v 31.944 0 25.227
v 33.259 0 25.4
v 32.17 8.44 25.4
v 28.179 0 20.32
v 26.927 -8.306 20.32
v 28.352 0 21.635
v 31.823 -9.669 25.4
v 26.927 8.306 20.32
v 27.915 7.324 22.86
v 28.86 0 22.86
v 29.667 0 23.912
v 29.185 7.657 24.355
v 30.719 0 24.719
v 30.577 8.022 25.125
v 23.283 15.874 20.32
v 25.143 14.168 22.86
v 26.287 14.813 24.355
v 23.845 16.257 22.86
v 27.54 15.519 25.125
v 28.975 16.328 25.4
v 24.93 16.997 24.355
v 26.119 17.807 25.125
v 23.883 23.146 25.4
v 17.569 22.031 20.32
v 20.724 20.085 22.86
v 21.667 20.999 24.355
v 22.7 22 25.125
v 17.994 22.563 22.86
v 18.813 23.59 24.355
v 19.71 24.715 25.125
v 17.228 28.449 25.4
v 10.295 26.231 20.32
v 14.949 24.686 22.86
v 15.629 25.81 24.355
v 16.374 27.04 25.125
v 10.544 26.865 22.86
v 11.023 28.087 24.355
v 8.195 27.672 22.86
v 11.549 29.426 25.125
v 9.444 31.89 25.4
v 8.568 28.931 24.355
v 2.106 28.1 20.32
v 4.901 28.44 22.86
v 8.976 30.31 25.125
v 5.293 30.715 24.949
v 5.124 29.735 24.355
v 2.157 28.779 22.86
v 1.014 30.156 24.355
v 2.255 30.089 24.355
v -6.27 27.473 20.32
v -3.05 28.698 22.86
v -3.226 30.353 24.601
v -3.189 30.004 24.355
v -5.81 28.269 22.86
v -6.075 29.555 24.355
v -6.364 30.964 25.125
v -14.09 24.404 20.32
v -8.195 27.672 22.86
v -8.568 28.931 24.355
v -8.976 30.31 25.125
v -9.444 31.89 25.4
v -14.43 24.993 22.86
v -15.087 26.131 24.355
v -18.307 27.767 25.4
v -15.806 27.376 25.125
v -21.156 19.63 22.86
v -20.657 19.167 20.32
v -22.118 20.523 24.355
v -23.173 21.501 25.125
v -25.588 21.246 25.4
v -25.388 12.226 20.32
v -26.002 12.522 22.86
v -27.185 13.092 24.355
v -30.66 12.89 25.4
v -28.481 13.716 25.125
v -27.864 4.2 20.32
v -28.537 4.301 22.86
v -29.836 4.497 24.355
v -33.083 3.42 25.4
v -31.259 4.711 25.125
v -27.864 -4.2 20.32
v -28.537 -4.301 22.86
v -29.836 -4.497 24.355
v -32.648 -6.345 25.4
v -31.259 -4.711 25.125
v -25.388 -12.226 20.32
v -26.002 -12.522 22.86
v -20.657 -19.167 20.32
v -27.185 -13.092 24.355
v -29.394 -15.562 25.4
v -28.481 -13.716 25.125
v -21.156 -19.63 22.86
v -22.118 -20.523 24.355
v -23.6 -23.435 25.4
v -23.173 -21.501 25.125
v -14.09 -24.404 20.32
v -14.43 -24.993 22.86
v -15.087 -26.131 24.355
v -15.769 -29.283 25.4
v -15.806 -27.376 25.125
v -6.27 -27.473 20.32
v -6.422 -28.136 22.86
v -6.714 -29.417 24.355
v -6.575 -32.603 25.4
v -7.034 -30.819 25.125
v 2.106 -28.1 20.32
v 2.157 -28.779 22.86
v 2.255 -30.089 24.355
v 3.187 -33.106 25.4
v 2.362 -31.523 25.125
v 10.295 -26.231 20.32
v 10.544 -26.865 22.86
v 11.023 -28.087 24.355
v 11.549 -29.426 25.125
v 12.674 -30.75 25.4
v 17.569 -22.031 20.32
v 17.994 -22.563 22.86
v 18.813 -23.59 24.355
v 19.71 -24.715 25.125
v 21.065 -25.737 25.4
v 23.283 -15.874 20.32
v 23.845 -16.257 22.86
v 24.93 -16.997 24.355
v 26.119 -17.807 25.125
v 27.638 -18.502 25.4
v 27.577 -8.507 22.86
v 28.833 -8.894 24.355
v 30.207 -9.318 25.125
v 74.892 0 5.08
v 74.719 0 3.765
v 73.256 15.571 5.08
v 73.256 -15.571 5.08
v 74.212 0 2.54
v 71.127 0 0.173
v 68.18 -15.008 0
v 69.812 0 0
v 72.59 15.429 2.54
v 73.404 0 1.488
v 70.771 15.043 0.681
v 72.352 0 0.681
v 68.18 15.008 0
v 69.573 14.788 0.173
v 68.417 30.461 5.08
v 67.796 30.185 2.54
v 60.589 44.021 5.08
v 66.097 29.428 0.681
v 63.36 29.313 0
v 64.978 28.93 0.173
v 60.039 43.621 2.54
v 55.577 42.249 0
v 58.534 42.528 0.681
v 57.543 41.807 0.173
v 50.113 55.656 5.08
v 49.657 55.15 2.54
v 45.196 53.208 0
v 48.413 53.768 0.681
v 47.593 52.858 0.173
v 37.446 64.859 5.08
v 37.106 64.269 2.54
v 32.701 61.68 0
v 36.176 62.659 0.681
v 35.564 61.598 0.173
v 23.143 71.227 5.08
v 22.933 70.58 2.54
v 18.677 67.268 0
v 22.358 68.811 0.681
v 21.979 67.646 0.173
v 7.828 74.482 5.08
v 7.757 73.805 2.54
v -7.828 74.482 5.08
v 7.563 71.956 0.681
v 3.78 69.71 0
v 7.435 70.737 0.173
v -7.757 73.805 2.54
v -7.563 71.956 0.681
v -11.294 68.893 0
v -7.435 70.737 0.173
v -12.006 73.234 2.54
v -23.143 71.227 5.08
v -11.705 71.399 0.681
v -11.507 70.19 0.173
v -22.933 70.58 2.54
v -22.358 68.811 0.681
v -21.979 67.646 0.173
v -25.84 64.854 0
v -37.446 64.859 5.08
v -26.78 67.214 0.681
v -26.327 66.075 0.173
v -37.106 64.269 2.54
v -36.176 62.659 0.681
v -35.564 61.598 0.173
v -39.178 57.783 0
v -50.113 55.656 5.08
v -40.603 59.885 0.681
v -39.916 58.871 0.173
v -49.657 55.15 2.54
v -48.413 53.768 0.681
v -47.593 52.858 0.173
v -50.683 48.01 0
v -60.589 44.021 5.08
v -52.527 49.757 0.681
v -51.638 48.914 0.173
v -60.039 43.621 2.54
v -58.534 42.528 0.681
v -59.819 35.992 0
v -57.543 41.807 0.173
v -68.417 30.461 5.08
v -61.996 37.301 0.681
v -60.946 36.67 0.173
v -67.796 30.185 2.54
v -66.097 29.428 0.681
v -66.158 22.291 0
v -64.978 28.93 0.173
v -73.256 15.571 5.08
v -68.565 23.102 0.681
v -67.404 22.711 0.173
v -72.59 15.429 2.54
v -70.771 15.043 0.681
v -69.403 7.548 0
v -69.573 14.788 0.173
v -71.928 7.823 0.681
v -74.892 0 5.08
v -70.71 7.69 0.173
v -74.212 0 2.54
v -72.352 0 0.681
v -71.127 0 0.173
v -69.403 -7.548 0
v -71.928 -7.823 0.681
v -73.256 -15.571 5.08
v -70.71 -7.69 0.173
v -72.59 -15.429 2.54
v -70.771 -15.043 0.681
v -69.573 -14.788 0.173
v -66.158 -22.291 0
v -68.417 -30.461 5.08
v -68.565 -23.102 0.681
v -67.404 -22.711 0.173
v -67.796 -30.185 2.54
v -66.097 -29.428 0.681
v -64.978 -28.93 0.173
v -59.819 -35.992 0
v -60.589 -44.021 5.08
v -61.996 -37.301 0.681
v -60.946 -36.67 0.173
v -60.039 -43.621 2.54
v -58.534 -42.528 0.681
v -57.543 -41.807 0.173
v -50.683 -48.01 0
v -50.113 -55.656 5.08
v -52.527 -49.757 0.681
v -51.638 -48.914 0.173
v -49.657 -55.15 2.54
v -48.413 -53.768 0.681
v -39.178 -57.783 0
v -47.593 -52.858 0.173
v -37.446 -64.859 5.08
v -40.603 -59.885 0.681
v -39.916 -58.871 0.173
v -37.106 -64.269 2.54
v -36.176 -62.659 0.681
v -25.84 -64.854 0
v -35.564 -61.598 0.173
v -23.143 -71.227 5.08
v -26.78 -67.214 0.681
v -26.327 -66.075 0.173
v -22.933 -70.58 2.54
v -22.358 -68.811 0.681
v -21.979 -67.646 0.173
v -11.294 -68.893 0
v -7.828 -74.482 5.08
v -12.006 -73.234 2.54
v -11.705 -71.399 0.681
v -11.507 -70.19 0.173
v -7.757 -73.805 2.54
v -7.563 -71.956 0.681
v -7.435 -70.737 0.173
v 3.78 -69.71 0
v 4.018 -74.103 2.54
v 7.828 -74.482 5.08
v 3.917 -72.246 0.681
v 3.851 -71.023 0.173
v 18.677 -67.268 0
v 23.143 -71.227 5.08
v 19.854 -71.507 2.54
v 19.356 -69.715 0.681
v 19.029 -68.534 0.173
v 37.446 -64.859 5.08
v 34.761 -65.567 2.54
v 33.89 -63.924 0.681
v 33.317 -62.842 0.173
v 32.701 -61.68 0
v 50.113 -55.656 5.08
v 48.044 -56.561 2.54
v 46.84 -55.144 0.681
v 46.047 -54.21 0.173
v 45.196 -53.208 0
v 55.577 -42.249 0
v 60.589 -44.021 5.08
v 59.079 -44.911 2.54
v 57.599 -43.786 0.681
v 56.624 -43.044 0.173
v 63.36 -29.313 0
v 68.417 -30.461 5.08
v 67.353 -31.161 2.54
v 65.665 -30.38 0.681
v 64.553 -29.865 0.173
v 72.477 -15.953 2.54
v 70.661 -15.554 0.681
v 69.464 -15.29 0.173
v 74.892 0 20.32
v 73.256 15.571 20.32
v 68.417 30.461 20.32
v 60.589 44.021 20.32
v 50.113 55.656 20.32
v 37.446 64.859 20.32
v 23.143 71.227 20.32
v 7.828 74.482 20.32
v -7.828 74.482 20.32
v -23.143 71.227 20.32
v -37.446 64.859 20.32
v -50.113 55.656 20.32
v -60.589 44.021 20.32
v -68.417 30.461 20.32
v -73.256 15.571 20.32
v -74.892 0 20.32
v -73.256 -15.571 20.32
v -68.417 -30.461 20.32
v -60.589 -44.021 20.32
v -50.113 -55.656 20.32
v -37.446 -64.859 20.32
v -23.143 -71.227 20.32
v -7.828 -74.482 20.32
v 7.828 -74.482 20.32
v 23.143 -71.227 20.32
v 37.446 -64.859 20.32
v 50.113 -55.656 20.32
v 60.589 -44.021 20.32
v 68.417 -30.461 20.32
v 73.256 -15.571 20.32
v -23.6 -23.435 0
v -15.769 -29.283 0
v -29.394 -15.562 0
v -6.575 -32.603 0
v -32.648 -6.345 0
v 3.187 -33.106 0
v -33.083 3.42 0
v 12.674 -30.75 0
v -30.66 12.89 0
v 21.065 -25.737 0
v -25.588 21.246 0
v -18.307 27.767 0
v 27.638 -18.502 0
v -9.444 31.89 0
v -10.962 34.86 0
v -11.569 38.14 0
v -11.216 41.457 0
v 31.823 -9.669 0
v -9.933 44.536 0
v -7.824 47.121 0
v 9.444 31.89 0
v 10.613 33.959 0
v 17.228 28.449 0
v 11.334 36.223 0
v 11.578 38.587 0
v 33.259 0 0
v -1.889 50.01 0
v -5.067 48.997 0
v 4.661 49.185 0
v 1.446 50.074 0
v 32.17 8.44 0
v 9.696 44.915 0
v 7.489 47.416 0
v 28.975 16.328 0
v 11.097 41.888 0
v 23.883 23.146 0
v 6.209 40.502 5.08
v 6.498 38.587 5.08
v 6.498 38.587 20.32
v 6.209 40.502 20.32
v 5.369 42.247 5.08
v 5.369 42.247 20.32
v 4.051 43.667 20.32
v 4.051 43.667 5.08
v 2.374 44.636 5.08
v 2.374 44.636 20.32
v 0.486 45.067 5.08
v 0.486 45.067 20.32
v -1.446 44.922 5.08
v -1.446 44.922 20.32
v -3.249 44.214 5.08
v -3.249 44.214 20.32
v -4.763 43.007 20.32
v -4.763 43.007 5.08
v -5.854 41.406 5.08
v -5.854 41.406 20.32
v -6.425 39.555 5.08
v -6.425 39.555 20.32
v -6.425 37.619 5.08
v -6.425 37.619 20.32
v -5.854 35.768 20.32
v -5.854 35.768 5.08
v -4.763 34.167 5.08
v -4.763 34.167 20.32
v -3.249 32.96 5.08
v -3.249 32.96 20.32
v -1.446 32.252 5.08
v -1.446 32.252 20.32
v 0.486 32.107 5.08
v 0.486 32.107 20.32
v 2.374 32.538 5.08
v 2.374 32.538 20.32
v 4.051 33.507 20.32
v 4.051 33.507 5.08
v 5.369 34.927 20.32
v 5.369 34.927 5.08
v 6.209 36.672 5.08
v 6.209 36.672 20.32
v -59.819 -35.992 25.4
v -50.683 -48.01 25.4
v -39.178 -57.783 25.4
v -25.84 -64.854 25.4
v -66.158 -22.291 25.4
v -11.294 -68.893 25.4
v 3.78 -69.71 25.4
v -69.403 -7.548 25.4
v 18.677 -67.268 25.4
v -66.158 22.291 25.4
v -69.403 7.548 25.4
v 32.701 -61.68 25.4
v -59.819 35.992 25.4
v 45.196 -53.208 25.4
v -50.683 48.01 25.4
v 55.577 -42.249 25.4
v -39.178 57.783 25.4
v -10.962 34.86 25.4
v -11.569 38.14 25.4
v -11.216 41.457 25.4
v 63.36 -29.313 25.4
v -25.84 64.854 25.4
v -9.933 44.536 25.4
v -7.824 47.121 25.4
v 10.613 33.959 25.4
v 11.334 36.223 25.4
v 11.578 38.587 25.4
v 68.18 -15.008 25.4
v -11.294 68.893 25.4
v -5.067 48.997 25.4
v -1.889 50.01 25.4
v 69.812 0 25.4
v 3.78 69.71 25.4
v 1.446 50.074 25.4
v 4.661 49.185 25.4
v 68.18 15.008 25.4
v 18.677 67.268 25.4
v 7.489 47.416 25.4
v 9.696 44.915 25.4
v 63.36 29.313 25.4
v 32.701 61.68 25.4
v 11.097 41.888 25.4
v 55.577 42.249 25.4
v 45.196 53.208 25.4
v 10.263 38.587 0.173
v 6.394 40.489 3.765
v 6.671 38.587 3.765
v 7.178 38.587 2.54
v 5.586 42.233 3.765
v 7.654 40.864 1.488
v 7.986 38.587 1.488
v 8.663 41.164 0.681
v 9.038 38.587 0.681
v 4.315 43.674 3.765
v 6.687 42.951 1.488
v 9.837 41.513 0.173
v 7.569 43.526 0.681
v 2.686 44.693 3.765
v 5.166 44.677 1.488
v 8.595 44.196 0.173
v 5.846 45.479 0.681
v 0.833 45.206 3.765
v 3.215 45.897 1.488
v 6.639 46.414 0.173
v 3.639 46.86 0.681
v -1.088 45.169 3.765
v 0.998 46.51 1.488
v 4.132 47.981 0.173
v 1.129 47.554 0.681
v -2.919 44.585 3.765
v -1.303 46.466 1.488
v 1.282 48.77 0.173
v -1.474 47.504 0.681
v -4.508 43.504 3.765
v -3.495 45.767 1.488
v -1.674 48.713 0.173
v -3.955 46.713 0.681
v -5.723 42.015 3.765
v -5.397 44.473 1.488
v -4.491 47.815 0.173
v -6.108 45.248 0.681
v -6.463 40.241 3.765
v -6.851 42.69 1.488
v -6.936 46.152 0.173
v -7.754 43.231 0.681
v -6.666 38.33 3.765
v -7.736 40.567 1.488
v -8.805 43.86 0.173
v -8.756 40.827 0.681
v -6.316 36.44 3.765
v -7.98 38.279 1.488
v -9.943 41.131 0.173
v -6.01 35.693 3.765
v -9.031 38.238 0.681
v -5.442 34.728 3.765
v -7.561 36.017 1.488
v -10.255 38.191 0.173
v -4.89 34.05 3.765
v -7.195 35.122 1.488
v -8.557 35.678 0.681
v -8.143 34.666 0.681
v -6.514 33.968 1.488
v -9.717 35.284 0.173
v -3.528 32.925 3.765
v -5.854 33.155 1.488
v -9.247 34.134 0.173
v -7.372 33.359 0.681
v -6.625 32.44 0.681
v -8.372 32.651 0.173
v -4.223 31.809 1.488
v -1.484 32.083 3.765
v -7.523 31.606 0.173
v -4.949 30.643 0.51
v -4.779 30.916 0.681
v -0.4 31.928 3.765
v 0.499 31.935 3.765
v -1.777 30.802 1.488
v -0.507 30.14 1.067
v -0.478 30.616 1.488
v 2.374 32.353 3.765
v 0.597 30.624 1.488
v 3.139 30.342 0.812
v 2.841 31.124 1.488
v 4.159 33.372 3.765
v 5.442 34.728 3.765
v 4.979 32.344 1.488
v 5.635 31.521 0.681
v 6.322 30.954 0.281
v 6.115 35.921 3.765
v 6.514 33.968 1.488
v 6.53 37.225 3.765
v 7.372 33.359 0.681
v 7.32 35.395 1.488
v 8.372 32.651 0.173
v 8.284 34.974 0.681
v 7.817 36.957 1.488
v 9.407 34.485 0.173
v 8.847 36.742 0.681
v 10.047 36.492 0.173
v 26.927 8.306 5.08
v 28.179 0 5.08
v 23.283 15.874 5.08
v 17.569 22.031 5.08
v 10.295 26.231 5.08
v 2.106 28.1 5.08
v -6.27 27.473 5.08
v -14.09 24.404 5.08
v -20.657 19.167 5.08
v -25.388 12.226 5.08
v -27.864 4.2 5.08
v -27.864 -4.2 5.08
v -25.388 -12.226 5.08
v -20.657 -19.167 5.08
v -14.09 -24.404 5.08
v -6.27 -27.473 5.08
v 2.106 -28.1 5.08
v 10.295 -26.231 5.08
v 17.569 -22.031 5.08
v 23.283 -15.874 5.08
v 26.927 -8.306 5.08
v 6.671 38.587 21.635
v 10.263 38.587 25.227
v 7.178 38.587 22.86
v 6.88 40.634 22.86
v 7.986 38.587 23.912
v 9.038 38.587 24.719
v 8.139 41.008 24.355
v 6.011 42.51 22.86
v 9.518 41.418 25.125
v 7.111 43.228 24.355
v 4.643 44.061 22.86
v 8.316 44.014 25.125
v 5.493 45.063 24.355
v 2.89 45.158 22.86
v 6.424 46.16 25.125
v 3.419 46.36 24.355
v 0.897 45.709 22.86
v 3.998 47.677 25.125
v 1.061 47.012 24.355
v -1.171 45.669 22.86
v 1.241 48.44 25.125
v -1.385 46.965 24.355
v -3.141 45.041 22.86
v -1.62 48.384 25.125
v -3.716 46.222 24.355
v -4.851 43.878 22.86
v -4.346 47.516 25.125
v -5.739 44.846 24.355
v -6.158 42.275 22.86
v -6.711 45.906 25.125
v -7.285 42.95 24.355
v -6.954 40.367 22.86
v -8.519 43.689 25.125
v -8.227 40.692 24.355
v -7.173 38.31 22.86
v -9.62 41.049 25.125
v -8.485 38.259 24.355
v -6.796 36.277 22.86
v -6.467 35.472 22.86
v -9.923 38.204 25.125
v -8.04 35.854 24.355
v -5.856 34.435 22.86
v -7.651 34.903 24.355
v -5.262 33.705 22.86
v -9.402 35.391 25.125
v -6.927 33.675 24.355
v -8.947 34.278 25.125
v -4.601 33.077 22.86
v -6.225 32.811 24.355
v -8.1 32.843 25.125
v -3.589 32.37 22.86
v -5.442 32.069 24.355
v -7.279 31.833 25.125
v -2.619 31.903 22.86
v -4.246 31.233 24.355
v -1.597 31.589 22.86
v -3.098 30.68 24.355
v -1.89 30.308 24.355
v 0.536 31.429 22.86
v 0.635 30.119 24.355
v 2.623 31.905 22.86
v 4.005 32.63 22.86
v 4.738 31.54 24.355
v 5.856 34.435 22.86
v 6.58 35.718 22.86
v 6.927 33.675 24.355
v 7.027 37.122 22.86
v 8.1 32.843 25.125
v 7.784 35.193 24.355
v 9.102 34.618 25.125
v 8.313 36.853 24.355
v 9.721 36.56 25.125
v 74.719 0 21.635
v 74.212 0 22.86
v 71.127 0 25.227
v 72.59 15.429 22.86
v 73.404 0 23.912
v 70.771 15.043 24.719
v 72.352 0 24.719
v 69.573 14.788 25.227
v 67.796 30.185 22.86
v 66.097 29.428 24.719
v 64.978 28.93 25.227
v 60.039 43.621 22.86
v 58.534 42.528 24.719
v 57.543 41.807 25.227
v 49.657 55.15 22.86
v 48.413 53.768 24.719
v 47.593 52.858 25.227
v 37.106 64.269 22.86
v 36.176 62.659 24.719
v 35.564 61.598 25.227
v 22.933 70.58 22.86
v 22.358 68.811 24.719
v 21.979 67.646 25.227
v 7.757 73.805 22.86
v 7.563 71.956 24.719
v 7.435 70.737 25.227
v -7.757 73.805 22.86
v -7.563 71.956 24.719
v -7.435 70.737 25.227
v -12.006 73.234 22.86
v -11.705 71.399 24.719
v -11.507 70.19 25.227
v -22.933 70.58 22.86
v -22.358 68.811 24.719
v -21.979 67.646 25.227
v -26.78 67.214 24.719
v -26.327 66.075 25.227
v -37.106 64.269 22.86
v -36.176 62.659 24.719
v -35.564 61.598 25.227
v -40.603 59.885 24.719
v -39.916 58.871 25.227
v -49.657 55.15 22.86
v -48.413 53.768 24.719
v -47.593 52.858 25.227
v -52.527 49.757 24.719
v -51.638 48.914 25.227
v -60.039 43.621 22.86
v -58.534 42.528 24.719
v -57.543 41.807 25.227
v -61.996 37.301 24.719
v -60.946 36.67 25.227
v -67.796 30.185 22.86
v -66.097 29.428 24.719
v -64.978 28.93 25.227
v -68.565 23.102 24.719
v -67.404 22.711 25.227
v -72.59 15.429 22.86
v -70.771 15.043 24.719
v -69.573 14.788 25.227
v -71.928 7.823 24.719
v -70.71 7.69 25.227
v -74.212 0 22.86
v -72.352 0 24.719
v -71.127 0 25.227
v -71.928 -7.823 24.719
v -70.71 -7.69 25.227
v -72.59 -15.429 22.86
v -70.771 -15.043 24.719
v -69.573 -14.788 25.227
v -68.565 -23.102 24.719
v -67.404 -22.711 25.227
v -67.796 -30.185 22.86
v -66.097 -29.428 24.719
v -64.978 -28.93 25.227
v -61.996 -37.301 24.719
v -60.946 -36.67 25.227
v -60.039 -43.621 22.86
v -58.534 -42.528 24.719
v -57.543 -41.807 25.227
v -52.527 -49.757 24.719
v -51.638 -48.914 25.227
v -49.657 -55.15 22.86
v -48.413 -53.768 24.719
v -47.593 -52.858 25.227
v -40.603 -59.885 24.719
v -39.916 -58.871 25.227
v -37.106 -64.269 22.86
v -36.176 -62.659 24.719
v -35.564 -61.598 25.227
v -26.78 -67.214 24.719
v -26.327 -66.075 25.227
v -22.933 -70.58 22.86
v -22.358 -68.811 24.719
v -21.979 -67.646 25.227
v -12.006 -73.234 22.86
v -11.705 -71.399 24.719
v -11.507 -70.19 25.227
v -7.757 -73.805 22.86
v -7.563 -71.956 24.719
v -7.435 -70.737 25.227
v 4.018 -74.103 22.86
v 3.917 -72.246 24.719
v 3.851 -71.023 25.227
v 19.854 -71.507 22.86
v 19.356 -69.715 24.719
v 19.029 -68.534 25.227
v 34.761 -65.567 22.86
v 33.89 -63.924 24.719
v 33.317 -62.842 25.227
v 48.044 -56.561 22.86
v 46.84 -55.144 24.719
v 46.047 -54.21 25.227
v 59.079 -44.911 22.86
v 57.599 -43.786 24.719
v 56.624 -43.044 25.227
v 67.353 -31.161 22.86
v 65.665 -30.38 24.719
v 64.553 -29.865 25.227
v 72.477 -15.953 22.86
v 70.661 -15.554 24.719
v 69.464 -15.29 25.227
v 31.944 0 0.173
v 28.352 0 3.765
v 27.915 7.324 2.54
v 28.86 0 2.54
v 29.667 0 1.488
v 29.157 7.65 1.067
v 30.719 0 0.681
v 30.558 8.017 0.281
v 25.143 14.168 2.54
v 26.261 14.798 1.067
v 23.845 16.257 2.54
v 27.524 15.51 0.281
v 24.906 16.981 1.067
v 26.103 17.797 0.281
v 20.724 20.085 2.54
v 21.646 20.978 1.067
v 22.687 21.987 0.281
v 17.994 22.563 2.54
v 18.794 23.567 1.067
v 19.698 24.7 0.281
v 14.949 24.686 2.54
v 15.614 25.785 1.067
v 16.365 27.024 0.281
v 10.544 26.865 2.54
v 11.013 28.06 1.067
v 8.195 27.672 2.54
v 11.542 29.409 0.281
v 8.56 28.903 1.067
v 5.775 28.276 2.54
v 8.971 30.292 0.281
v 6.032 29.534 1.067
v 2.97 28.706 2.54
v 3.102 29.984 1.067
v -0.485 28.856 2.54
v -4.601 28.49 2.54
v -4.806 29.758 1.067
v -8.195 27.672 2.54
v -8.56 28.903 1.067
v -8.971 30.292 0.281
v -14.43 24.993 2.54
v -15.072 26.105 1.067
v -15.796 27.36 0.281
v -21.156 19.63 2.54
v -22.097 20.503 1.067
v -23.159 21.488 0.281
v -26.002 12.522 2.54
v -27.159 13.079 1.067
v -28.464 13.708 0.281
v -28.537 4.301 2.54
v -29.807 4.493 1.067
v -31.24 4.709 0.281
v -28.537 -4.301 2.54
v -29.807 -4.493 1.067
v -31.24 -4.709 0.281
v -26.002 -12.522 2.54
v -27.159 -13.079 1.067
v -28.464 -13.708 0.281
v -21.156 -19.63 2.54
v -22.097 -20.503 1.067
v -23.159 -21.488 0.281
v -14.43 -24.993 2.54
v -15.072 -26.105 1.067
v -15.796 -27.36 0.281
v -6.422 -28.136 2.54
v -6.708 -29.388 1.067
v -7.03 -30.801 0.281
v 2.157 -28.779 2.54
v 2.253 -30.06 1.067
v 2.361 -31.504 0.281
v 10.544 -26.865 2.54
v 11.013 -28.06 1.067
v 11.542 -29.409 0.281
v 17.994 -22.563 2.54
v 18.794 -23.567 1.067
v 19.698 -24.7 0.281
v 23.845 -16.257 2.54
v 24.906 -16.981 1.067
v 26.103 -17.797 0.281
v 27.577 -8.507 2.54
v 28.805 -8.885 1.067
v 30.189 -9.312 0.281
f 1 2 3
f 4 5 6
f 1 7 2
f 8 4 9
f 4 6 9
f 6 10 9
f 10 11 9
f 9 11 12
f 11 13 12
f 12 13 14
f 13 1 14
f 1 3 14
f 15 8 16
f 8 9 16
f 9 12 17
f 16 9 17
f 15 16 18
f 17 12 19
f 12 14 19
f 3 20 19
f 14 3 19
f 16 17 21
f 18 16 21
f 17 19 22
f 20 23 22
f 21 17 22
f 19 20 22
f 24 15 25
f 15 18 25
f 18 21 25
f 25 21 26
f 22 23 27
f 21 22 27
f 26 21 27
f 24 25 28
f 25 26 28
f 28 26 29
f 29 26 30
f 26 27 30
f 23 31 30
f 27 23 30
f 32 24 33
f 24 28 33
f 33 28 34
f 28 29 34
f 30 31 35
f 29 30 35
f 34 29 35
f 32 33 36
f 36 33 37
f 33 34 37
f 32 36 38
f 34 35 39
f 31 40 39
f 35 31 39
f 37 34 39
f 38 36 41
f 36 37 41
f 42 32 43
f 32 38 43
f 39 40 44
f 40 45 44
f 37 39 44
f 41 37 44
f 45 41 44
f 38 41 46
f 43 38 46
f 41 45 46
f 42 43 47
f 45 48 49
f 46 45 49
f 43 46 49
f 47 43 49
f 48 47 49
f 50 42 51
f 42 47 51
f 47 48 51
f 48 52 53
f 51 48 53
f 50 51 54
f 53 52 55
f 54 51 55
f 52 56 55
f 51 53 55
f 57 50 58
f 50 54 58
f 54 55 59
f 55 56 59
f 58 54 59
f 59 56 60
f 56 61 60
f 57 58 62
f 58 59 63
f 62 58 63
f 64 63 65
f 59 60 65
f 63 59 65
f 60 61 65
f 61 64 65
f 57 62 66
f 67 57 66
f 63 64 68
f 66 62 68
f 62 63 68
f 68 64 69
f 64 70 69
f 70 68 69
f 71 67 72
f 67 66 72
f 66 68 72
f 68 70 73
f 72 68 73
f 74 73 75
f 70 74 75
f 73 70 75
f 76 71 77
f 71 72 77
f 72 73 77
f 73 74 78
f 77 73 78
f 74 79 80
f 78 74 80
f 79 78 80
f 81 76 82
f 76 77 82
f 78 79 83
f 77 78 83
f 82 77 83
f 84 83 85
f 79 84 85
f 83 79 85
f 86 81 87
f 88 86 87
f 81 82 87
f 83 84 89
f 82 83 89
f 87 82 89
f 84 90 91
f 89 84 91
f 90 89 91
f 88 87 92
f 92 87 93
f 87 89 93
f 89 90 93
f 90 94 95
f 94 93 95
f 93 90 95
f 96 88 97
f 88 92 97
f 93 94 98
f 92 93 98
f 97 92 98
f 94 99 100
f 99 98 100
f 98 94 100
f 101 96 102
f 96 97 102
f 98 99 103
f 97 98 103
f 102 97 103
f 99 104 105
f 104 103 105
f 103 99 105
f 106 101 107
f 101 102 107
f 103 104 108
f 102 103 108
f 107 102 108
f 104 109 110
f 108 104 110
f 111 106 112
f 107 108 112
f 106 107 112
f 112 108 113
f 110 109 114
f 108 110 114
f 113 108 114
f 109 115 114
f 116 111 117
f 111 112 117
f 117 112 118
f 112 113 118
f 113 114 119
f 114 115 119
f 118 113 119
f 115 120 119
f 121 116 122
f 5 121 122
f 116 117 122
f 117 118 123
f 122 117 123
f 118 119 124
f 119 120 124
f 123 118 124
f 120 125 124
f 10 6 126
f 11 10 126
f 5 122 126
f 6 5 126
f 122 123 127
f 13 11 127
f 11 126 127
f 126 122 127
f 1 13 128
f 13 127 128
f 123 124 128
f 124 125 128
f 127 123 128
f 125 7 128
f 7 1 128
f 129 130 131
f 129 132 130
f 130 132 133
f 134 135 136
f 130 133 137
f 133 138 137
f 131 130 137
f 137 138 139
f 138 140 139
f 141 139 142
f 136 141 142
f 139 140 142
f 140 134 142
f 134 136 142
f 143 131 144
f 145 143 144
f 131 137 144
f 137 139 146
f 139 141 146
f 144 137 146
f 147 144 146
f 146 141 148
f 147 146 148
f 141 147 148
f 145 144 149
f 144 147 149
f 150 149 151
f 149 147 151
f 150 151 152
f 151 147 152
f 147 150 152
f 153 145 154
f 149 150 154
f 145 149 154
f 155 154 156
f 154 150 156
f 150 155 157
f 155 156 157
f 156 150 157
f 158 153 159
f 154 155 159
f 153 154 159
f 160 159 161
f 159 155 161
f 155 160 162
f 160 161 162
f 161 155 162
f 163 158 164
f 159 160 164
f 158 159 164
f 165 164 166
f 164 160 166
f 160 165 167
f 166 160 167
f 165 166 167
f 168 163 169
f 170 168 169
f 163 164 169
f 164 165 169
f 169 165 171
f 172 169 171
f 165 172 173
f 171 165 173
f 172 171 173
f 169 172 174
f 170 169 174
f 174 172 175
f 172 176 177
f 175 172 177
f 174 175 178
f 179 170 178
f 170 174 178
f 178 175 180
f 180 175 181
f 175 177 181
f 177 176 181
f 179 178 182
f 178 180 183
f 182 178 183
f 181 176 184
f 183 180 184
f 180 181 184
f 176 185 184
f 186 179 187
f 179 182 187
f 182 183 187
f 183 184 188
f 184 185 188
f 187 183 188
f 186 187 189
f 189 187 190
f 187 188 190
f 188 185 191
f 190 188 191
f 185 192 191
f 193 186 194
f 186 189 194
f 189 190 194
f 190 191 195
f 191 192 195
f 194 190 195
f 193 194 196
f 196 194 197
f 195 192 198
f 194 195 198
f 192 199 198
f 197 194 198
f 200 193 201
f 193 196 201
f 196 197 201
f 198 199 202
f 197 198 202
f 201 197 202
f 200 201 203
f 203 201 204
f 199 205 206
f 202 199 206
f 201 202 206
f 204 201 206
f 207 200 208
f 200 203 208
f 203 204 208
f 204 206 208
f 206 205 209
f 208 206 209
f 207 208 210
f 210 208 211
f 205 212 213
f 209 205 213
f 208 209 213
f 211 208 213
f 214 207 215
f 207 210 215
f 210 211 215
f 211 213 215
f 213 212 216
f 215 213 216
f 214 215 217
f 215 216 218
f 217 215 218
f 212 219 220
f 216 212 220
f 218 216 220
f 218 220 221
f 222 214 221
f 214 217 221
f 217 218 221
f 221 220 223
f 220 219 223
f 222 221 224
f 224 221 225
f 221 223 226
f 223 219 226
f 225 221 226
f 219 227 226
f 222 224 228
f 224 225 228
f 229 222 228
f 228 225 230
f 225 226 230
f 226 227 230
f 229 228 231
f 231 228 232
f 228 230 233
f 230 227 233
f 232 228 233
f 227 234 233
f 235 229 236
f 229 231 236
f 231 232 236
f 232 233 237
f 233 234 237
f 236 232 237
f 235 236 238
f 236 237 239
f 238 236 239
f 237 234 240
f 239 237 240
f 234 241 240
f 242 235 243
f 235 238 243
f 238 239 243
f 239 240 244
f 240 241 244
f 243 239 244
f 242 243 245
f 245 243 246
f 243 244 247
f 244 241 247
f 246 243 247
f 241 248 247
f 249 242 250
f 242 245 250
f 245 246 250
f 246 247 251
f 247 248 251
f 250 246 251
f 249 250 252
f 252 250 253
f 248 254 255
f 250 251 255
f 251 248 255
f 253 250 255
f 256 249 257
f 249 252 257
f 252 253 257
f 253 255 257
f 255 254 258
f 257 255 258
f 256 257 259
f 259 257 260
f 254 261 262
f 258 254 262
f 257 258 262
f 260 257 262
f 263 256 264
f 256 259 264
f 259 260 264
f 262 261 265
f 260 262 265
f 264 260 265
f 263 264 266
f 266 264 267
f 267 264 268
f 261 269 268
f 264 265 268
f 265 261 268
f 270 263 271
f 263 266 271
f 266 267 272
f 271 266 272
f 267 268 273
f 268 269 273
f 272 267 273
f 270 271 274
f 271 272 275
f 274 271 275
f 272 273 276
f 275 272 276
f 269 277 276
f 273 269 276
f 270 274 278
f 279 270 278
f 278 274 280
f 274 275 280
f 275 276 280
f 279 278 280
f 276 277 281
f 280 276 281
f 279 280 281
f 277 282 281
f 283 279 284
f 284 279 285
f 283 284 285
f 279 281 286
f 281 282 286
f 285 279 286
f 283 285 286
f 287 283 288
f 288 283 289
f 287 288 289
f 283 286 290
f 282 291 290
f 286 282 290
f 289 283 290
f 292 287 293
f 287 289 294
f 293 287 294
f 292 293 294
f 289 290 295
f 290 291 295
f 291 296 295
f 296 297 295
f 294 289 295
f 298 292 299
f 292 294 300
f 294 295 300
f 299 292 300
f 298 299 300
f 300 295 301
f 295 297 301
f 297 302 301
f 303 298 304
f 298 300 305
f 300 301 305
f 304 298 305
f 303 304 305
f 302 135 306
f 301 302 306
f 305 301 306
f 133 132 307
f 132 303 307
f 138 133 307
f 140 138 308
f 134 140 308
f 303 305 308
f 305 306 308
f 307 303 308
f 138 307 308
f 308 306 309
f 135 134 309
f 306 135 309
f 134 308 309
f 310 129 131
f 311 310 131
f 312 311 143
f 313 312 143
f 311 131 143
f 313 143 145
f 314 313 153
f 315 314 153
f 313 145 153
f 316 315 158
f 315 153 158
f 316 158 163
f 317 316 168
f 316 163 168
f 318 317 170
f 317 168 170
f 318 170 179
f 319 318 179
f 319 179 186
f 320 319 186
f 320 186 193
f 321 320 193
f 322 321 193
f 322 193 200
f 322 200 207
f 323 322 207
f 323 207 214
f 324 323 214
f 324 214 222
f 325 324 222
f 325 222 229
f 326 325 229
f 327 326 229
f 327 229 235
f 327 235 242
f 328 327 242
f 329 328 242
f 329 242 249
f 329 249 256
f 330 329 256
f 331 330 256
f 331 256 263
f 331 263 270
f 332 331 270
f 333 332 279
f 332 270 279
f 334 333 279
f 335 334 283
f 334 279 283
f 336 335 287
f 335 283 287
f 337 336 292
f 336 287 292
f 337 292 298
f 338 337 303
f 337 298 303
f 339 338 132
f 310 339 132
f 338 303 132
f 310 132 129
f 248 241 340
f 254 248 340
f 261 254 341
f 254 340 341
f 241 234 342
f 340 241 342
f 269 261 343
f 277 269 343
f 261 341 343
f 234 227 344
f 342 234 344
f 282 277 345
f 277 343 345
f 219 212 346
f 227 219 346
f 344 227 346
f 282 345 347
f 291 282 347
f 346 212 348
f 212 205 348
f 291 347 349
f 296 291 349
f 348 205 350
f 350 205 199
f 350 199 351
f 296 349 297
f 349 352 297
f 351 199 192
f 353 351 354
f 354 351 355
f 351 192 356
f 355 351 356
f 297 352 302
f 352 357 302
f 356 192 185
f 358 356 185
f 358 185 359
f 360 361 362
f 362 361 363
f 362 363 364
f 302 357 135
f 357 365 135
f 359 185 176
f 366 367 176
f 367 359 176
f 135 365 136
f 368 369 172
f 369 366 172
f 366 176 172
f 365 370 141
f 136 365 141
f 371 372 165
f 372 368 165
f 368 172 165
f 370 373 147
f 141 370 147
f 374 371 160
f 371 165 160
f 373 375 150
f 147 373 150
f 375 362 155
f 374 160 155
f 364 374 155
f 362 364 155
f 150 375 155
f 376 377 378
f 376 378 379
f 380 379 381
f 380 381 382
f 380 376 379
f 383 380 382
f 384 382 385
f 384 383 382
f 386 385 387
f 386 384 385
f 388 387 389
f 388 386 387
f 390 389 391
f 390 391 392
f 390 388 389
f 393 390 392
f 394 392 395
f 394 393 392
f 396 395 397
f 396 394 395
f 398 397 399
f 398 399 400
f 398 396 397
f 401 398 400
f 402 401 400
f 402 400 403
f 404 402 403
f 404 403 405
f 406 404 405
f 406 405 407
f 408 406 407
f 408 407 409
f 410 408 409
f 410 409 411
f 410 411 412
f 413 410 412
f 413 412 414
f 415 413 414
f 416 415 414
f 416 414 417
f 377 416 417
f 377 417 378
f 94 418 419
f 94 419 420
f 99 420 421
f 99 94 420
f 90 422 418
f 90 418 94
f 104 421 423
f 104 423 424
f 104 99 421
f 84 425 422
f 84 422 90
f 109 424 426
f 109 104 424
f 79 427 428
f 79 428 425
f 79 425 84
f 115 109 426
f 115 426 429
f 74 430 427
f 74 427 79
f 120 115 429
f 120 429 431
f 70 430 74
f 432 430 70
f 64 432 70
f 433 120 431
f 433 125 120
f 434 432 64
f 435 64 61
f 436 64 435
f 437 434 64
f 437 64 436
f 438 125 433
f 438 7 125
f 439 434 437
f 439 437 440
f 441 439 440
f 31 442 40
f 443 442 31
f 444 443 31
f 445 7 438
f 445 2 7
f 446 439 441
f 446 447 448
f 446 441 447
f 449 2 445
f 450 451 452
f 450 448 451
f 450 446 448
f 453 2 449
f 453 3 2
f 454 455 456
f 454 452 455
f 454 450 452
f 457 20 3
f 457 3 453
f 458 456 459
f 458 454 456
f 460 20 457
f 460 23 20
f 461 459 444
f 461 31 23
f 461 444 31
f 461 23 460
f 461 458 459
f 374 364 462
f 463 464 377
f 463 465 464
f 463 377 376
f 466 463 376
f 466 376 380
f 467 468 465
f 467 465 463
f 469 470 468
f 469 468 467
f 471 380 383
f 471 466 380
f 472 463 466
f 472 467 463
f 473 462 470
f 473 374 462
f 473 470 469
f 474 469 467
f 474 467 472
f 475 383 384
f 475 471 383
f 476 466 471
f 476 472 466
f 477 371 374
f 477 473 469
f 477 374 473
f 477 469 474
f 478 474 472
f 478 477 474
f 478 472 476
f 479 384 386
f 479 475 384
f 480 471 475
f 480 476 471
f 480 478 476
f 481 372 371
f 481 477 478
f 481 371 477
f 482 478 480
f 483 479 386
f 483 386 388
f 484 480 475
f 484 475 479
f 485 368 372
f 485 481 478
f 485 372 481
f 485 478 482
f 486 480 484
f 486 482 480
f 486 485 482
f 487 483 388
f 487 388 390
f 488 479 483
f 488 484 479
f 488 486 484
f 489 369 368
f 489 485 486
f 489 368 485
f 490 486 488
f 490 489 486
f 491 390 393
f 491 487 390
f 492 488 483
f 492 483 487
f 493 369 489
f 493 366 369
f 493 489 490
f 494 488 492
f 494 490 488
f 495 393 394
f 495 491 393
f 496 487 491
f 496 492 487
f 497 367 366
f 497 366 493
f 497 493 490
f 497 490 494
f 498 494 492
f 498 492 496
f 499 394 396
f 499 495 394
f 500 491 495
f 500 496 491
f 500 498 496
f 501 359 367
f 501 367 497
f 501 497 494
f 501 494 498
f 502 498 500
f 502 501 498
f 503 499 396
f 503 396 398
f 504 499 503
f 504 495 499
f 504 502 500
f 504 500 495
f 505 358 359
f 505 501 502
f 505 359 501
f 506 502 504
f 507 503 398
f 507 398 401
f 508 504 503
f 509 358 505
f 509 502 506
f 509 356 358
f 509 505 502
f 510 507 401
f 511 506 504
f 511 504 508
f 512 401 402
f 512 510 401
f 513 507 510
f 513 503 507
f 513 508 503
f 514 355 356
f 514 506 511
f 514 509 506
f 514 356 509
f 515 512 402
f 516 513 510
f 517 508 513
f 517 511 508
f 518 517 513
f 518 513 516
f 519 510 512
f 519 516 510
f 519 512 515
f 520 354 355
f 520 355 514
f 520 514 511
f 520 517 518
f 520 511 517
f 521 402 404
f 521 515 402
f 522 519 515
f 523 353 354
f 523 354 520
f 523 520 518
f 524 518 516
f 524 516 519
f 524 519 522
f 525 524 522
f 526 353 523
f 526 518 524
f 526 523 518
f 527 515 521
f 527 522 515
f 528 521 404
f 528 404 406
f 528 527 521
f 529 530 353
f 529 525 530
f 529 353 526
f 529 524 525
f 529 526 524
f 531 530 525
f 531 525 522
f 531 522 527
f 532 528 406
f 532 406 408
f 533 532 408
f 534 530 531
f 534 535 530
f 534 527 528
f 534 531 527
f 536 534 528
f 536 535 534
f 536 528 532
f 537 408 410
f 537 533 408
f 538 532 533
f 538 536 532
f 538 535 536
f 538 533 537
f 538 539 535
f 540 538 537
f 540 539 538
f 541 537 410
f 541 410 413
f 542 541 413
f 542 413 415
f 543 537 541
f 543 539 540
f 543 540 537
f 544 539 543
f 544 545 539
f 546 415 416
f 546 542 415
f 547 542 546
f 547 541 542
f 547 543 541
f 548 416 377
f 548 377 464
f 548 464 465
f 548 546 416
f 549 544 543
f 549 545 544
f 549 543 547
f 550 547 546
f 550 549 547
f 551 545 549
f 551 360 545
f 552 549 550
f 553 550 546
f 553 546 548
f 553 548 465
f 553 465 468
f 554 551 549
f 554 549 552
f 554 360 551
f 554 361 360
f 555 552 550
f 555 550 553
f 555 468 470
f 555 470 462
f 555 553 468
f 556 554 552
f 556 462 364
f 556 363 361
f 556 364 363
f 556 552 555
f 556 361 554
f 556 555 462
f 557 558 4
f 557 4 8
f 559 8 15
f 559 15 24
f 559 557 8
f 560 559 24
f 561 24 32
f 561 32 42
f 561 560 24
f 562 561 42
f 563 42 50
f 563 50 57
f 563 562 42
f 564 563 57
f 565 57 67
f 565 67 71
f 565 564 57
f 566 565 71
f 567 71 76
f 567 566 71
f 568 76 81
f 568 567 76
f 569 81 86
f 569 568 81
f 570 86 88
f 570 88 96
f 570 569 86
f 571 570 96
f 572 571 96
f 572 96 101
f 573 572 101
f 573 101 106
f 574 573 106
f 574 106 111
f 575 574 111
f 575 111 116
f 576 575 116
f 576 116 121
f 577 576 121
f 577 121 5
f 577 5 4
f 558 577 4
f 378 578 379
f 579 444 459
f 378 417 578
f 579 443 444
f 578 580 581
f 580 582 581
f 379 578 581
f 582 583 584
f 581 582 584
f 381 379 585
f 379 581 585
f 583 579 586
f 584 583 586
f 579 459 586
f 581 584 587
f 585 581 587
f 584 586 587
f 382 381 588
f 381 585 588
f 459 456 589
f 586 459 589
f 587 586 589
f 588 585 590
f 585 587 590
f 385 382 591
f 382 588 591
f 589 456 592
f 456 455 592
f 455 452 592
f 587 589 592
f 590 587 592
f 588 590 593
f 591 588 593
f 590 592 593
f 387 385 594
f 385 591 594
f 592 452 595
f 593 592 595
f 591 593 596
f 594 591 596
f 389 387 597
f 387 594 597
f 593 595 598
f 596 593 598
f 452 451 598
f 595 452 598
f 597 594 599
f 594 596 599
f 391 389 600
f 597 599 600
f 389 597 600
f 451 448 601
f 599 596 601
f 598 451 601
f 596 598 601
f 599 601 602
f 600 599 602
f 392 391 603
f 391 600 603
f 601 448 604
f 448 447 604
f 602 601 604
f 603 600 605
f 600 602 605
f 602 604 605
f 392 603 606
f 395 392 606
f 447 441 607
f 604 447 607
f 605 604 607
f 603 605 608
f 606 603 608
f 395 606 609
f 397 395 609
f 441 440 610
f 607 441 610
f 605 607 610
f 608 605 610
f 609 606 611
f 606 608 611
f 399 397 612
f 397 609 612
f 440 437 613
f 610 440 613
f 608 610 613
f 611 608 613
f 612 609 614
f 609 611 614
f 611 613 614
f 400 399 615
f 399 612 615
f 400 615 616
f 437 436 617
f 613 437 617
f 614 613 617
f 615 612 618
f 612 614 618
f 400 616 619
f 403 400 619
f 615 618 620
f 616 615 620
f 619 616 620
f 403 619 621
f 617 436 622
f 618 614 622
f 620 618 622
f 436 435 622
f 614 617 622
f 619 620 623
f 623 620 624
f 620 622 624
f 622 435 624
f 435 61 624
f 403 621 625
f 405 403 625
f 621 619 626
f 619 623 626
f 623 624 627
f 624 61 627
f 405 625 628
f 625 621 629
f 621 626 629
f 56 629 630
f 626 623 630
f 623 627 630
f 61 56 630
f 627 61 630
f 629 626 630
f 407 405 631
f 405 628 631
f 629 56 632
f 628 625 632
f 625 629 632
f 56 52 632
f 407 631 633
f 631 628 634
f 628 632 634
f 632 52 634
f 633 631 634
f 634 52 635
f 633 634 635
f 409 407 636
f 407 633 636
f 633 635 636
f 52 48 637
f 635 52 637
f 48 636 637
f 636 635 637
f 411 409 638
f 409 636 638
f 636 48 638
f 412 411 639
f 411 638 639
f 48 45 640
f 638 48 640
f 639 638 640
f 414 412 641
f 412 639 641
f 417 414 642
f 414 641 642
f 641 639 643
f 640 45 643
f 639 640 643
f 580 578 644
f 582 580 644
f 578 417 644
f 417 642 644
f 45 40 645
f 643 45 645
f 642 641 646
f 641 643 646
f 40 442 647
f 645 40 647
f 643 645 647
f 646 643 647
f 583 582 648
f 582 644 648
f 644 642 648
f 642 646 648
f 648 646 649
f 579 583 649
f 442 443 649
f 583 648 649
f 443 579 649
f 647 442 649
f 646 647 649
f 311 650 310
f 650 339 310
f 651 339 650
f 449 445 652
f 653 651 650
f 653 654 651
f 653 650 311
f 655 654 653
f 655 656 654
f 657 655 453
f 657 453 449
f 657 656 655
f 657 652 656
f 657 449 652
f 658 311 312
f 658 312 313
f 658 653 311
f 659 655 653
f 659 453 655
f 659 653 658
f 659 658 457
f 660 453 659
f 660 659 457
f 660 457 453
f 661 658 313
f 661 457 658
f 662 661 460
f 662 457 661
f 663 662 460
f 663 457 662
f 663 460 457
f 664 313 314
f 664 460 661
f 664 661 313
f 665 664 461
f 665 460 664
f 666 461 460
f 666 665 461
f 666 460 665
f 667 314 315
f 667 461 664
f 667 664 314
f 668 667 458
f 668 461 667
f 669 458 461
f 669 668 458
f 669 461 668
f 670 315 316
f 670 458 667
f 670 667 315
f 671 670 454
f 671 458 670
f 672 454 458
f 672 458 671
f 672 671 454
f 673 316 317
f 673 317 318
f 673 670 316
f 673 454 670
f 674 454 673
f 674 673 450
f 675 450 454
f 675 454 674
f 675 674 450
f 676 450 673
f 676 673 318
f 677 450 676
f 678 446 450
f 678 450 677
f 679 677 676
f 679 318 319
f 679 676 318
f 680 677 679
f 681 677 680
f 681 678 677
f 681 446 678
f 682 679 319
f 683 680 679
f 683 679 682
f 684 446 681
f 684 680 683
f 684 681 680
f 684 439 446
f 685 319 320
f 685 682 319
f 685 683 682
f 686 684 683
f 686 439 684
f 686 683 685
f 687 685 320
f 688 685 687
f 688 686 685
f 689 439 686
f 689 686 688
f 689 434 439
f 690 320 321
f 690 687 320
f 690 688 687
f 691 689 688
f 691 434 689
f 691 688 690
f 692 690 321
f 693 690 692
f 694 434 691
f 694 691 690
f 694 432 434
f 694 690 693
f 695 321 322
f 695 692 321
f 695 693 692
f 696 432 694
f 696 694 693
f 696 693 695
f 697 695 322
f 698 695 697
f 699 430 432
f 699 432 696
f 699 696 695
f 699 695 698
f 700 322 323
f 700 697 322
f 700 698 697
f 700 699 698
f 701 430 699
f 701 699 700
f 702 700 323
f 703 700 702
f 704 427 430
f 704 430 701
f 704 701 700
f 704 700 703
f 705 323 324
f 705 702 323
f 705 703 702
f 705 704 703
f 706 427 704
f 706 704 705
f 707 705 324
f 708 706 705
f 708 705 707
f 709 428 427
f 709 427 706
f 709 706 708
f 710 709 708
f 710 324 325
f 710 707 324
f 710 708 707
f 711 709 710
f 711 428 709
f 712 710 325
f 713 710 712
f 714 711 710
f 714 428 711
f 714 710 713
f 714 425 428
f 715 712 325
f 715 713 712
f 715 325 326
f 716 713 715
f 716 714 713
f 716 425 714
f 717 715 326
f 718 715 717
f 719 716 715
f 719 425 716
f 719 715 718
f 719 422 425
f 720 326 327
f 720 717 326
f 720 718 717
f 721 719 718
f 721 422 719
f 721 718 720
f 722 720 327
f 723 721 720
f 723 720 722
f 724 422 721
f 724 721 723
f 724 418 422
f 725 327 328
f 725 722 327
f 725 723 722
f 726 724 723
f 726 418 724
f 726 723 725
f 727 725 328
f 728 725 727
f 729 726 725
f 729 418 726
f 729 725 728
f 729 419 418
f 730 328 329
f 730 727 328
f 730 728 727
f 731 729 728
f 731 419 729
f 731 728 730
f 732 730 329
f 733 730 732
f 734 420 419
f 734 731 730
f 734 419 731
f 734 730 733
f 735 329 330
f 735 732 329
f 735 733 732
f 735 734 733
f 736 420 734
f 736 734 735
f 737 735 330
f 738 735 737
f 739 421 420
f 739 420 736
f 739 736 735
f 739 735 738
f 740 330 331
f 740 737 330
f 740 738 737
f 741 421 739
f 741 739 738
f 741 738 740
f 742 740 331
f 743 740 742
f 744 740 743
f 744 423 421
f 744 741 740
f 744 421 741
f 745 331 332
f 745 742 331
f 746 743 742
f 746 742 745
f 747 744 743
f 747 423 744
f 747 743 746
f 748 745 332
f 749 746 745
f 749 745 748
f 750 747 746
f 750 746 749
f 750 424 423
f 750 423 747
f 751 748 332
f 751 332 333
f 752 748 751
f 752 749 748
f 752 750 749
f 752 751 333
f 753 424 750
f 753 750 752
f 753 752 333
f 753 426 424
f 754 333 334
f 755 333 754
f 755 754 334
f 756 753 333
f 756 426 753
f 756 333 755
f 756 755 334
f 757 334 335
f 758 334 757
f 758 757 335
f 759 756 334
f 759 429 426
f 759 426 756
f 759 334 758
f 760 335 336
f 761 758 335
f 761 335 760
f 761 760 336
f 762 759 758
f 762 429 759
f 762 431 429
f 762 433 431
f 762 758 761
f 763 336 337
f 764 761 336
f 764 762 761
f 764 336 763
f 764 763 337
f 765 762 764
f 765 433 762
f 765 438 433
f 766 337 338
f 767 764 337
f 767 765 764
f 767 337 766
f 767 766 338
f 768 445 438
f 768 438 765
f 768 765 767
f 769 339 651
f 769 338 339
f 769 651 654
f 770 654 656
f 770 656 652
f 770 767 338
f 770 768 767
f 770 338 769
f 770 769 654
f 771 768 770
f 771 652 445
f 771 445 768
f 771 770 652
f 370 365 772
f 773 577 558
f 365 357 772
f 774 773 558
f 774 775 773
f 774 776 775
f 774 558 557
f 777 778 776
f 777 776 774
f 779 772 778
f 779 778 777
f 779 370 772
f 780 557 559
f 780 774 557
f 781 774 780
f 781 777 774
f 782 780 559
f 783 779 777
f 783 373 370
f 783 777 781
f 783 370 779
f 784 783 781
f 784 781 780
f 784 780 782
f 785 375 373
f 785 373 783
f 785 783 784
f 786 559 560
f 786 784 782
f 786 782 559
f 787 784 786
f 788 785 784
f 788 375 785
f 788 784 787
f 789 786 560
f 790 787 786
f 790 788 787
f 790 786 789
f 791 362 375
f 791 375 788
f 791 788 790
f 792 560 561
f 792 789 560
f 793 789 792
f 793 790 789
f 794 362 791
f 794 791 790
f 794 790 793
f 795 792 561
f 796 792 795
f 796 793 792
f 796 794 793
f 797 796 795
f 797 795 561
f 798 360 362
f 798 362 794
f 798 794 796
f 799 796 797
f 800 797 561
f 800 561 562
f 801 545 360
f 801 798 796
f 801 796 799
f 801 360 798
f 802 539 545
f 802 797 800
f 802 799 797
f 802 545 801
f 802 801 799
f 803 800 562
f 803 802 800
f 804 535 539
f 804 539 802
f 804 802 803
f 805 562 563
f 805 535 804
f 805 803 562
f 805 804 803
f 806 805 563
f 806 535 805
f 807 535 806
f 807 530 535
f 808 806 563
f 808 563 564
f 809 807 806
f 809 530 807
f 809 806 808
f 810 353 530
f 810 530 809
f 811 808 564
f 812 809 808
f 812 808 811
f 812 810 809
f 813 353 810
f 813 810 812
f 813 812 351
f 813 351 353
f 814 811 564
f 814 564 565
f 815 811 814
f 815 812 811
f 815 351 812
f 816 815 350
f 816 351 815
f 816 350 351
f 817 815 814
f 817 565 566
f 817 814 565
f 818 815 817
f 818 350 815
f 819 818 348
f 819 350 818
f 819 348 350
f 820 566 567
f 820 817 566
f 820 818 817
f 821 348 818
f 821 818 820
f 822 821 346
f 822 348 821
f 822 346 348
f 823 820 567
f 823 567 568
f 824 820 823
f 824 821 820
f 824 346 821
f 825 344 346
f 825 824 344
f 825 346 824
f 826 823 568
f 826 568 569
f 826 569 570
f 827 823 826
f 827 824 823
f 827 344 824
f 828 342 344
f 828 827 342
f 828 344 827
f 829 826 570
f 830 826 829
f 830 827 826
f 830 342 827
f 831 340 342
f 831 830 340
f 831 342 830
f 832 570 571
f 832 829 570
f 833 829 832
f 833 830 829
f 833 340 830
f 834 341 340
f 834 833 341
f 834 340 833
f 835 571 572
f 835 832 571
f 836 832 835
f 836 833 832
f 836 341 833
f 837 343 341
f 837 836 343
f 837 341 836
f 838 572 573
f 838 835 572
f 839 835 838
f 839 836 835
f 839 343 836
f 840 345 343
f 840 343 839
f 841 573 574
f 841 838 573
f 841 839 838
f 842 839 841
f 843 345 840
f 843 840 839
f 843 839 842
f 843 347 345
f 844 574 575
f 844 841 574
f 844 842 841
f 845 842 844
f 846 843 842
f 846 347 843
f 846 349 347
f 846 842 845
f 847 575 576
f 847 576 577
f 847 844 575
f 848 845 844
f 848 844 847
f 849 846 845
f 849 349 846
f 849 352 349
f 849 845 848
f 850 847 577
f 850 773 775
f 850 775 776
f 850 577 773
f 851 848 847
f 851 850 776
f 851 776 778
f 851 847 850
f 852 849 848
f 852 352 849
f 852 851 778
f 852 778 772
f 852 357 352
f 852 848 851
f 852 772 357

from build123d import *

# Parameters (mm, degrees)
F0_R     = 74.892271749
F0_R_2   = 28.179048931
F0_R_3   = 6.4977417518
F1_DEPTH = 25.4


# Not quite as in the source:
# - a fillet or chamfer that OpenCascade refuses, or shapes differently, is made with other operations: its cross-section is extruded or revolved along the edge and cut away or added


with BuildPart() as f1:
    # F0 (on Top) → F1 (new body)
    with BuildSketch(Plane.XY):
        Circle(F0_R)
        Circle(F0_R_2, mode=Mode.SUBTRACT)
        with Locations((0, 38.5870411992)):
            Circle(F0_R_3, mode=Mode.SUBTRACT)
    extrude(amount=F1_DEPTH)

    # F2: fillet of radius 5.08 on 7 edges, made by hand

    # F2_s1 → F2_t2 (revolve, cut)
    with BuildSketch(Plane.XZ):
        with BuildLine():
            ThreePointArc((74.892271749, 20.32), (73.4043741975, 23.9121024484), (69.812271749, 25.4))
            Line((69.812271749, 25.4), (69.812271749, 25.5016))
            Line((69.812271749, 25.5016), (74.993871749, 25.5016))
            Line((74.993871749, 25.5016), (74.993871749, 20.32))
            Line((74.993871749, 20.32), (74.892271749, 20.32))
        make_face()
    revolve(axis=Axis((0, 0, 25.4), (0, 0, 1)), mode=Mode.SUBTRACT)

    # F2_s3 → F2_t4 (revolve, cut)
    with BuildSketch(Plane.XZ):
        with BuildLine():
            ThreePointArc((28.179048931, 20.32), (29.6669464826, 23.9121024484), (33.259048931, 25.4))
            Line((33.259048931, 25.4), (33.259048931, 25.5016))
            Line((33.259048931, 25.5016), (28.077448931, 25.5016))
            Line((28.077448931, 25.5016), (28.077448931, 20.32))
            Line((28.077448931, 20.32), (28.179048931, 20.32))
        make_face()
    revolve(axis=Axis((0, 0, 25.4), (0, 0, 1)), mode=Mode.SUBTRACT)

    # F2_s5 → F2_t6 (revolve, cut)
    with BuildSketch(Plane.XZ.offset(-38.5870411992)):
        with BuildLine():
            ThreePointArc((6.4977417518, 20.32), (7.9856393033, 23.9121024484), (11.5777417518, 25.4))
            Line((11.5777417518, 25.4), (11.5777417518, 25.5016))
            Line((11.5777417518, 25.5016), (6.3961417518, 25.5016))
            Line((6.3961417518, 25.5016), (6.3961417518, 20.32))
            Line((6.3961417518, 20.32), (6.4977417518, 20.32))
        make_face()
    revolve(axis=Axis((0, 38.5870411992, 25.4), (0, 0, 1)), mode=Mode.SUBTRACT)

    # F2_s7 → F2_t8 (revolve, cut)
    with BuildSketch(Plane.XZ.offset(-38.5870411992)):
        with BuildLine():
            ThreePointArc((6.4977417518, 5.08), (7.9856393033, 1.4878975516), (11.5777417518, 0))
            Line((11.5777417518, 0), (11.5777417518, -0.1016))
            Line((11.5777417518, -0.1016), (6.3961417518, -0.1016))
            Line((6.3961417518, -0.1016), (6.3961417518, 5.08))
            Line((6.3961417518, 5.08), (6.4977417518, 5.08))
        make_face()
    revolve(axis=Axis((0, 38.5870411992, 0), (0, 0, 1)), mode=Mode.SUBTRACT)

    # F2_s9 → F2_t10 (revolve, cut)
    with BuildSketch(Plane.XZ):
        with BuildLine():
            ThreePointArc((28.179048931, 5.08), (29.6669464826, 1.4878975516), (33.259048931, 0))
            Line((33.259048931, 0), (33.259048931, -0.1016))
            Line((33.259048931, -0.1016), (28.077448931, -0.1016))
            Line((28.077448931, -0.1016), (28.077448931, 5.08))
            Line((28.077448931, 5.08), (28.179048931, 5.08))
        make_face()
    revolve(axis=Axis((0, 0, 0), (0, 0, 1)), mode=Mode.SUBTRACT)

    # F2_s11 → F2_t12 (revolve, cut)
    with BuildSketch(Plane.XZ):
        with BuildLine():
            ThreePointArc((74.892271749, 5.08), (73.4043741975, 1.4878975516), (69.812271749, 0))
            Line((69.812271749, 0), (69.812271749, -0.1016))
            Line((69.812271749, -0.1016), (74.993871749, -0.1016))
            Line((74.993871749, -0.1016), (74.993871749, 5.08))
            Line((74.993871749, 5.08), (74.892271749, 5.08))
        make_face()
    revolve(axis=Axis((0, 0, 0), (0, 0, 1)), mode=Mode.SUBTRACT)


solid = f1.part
